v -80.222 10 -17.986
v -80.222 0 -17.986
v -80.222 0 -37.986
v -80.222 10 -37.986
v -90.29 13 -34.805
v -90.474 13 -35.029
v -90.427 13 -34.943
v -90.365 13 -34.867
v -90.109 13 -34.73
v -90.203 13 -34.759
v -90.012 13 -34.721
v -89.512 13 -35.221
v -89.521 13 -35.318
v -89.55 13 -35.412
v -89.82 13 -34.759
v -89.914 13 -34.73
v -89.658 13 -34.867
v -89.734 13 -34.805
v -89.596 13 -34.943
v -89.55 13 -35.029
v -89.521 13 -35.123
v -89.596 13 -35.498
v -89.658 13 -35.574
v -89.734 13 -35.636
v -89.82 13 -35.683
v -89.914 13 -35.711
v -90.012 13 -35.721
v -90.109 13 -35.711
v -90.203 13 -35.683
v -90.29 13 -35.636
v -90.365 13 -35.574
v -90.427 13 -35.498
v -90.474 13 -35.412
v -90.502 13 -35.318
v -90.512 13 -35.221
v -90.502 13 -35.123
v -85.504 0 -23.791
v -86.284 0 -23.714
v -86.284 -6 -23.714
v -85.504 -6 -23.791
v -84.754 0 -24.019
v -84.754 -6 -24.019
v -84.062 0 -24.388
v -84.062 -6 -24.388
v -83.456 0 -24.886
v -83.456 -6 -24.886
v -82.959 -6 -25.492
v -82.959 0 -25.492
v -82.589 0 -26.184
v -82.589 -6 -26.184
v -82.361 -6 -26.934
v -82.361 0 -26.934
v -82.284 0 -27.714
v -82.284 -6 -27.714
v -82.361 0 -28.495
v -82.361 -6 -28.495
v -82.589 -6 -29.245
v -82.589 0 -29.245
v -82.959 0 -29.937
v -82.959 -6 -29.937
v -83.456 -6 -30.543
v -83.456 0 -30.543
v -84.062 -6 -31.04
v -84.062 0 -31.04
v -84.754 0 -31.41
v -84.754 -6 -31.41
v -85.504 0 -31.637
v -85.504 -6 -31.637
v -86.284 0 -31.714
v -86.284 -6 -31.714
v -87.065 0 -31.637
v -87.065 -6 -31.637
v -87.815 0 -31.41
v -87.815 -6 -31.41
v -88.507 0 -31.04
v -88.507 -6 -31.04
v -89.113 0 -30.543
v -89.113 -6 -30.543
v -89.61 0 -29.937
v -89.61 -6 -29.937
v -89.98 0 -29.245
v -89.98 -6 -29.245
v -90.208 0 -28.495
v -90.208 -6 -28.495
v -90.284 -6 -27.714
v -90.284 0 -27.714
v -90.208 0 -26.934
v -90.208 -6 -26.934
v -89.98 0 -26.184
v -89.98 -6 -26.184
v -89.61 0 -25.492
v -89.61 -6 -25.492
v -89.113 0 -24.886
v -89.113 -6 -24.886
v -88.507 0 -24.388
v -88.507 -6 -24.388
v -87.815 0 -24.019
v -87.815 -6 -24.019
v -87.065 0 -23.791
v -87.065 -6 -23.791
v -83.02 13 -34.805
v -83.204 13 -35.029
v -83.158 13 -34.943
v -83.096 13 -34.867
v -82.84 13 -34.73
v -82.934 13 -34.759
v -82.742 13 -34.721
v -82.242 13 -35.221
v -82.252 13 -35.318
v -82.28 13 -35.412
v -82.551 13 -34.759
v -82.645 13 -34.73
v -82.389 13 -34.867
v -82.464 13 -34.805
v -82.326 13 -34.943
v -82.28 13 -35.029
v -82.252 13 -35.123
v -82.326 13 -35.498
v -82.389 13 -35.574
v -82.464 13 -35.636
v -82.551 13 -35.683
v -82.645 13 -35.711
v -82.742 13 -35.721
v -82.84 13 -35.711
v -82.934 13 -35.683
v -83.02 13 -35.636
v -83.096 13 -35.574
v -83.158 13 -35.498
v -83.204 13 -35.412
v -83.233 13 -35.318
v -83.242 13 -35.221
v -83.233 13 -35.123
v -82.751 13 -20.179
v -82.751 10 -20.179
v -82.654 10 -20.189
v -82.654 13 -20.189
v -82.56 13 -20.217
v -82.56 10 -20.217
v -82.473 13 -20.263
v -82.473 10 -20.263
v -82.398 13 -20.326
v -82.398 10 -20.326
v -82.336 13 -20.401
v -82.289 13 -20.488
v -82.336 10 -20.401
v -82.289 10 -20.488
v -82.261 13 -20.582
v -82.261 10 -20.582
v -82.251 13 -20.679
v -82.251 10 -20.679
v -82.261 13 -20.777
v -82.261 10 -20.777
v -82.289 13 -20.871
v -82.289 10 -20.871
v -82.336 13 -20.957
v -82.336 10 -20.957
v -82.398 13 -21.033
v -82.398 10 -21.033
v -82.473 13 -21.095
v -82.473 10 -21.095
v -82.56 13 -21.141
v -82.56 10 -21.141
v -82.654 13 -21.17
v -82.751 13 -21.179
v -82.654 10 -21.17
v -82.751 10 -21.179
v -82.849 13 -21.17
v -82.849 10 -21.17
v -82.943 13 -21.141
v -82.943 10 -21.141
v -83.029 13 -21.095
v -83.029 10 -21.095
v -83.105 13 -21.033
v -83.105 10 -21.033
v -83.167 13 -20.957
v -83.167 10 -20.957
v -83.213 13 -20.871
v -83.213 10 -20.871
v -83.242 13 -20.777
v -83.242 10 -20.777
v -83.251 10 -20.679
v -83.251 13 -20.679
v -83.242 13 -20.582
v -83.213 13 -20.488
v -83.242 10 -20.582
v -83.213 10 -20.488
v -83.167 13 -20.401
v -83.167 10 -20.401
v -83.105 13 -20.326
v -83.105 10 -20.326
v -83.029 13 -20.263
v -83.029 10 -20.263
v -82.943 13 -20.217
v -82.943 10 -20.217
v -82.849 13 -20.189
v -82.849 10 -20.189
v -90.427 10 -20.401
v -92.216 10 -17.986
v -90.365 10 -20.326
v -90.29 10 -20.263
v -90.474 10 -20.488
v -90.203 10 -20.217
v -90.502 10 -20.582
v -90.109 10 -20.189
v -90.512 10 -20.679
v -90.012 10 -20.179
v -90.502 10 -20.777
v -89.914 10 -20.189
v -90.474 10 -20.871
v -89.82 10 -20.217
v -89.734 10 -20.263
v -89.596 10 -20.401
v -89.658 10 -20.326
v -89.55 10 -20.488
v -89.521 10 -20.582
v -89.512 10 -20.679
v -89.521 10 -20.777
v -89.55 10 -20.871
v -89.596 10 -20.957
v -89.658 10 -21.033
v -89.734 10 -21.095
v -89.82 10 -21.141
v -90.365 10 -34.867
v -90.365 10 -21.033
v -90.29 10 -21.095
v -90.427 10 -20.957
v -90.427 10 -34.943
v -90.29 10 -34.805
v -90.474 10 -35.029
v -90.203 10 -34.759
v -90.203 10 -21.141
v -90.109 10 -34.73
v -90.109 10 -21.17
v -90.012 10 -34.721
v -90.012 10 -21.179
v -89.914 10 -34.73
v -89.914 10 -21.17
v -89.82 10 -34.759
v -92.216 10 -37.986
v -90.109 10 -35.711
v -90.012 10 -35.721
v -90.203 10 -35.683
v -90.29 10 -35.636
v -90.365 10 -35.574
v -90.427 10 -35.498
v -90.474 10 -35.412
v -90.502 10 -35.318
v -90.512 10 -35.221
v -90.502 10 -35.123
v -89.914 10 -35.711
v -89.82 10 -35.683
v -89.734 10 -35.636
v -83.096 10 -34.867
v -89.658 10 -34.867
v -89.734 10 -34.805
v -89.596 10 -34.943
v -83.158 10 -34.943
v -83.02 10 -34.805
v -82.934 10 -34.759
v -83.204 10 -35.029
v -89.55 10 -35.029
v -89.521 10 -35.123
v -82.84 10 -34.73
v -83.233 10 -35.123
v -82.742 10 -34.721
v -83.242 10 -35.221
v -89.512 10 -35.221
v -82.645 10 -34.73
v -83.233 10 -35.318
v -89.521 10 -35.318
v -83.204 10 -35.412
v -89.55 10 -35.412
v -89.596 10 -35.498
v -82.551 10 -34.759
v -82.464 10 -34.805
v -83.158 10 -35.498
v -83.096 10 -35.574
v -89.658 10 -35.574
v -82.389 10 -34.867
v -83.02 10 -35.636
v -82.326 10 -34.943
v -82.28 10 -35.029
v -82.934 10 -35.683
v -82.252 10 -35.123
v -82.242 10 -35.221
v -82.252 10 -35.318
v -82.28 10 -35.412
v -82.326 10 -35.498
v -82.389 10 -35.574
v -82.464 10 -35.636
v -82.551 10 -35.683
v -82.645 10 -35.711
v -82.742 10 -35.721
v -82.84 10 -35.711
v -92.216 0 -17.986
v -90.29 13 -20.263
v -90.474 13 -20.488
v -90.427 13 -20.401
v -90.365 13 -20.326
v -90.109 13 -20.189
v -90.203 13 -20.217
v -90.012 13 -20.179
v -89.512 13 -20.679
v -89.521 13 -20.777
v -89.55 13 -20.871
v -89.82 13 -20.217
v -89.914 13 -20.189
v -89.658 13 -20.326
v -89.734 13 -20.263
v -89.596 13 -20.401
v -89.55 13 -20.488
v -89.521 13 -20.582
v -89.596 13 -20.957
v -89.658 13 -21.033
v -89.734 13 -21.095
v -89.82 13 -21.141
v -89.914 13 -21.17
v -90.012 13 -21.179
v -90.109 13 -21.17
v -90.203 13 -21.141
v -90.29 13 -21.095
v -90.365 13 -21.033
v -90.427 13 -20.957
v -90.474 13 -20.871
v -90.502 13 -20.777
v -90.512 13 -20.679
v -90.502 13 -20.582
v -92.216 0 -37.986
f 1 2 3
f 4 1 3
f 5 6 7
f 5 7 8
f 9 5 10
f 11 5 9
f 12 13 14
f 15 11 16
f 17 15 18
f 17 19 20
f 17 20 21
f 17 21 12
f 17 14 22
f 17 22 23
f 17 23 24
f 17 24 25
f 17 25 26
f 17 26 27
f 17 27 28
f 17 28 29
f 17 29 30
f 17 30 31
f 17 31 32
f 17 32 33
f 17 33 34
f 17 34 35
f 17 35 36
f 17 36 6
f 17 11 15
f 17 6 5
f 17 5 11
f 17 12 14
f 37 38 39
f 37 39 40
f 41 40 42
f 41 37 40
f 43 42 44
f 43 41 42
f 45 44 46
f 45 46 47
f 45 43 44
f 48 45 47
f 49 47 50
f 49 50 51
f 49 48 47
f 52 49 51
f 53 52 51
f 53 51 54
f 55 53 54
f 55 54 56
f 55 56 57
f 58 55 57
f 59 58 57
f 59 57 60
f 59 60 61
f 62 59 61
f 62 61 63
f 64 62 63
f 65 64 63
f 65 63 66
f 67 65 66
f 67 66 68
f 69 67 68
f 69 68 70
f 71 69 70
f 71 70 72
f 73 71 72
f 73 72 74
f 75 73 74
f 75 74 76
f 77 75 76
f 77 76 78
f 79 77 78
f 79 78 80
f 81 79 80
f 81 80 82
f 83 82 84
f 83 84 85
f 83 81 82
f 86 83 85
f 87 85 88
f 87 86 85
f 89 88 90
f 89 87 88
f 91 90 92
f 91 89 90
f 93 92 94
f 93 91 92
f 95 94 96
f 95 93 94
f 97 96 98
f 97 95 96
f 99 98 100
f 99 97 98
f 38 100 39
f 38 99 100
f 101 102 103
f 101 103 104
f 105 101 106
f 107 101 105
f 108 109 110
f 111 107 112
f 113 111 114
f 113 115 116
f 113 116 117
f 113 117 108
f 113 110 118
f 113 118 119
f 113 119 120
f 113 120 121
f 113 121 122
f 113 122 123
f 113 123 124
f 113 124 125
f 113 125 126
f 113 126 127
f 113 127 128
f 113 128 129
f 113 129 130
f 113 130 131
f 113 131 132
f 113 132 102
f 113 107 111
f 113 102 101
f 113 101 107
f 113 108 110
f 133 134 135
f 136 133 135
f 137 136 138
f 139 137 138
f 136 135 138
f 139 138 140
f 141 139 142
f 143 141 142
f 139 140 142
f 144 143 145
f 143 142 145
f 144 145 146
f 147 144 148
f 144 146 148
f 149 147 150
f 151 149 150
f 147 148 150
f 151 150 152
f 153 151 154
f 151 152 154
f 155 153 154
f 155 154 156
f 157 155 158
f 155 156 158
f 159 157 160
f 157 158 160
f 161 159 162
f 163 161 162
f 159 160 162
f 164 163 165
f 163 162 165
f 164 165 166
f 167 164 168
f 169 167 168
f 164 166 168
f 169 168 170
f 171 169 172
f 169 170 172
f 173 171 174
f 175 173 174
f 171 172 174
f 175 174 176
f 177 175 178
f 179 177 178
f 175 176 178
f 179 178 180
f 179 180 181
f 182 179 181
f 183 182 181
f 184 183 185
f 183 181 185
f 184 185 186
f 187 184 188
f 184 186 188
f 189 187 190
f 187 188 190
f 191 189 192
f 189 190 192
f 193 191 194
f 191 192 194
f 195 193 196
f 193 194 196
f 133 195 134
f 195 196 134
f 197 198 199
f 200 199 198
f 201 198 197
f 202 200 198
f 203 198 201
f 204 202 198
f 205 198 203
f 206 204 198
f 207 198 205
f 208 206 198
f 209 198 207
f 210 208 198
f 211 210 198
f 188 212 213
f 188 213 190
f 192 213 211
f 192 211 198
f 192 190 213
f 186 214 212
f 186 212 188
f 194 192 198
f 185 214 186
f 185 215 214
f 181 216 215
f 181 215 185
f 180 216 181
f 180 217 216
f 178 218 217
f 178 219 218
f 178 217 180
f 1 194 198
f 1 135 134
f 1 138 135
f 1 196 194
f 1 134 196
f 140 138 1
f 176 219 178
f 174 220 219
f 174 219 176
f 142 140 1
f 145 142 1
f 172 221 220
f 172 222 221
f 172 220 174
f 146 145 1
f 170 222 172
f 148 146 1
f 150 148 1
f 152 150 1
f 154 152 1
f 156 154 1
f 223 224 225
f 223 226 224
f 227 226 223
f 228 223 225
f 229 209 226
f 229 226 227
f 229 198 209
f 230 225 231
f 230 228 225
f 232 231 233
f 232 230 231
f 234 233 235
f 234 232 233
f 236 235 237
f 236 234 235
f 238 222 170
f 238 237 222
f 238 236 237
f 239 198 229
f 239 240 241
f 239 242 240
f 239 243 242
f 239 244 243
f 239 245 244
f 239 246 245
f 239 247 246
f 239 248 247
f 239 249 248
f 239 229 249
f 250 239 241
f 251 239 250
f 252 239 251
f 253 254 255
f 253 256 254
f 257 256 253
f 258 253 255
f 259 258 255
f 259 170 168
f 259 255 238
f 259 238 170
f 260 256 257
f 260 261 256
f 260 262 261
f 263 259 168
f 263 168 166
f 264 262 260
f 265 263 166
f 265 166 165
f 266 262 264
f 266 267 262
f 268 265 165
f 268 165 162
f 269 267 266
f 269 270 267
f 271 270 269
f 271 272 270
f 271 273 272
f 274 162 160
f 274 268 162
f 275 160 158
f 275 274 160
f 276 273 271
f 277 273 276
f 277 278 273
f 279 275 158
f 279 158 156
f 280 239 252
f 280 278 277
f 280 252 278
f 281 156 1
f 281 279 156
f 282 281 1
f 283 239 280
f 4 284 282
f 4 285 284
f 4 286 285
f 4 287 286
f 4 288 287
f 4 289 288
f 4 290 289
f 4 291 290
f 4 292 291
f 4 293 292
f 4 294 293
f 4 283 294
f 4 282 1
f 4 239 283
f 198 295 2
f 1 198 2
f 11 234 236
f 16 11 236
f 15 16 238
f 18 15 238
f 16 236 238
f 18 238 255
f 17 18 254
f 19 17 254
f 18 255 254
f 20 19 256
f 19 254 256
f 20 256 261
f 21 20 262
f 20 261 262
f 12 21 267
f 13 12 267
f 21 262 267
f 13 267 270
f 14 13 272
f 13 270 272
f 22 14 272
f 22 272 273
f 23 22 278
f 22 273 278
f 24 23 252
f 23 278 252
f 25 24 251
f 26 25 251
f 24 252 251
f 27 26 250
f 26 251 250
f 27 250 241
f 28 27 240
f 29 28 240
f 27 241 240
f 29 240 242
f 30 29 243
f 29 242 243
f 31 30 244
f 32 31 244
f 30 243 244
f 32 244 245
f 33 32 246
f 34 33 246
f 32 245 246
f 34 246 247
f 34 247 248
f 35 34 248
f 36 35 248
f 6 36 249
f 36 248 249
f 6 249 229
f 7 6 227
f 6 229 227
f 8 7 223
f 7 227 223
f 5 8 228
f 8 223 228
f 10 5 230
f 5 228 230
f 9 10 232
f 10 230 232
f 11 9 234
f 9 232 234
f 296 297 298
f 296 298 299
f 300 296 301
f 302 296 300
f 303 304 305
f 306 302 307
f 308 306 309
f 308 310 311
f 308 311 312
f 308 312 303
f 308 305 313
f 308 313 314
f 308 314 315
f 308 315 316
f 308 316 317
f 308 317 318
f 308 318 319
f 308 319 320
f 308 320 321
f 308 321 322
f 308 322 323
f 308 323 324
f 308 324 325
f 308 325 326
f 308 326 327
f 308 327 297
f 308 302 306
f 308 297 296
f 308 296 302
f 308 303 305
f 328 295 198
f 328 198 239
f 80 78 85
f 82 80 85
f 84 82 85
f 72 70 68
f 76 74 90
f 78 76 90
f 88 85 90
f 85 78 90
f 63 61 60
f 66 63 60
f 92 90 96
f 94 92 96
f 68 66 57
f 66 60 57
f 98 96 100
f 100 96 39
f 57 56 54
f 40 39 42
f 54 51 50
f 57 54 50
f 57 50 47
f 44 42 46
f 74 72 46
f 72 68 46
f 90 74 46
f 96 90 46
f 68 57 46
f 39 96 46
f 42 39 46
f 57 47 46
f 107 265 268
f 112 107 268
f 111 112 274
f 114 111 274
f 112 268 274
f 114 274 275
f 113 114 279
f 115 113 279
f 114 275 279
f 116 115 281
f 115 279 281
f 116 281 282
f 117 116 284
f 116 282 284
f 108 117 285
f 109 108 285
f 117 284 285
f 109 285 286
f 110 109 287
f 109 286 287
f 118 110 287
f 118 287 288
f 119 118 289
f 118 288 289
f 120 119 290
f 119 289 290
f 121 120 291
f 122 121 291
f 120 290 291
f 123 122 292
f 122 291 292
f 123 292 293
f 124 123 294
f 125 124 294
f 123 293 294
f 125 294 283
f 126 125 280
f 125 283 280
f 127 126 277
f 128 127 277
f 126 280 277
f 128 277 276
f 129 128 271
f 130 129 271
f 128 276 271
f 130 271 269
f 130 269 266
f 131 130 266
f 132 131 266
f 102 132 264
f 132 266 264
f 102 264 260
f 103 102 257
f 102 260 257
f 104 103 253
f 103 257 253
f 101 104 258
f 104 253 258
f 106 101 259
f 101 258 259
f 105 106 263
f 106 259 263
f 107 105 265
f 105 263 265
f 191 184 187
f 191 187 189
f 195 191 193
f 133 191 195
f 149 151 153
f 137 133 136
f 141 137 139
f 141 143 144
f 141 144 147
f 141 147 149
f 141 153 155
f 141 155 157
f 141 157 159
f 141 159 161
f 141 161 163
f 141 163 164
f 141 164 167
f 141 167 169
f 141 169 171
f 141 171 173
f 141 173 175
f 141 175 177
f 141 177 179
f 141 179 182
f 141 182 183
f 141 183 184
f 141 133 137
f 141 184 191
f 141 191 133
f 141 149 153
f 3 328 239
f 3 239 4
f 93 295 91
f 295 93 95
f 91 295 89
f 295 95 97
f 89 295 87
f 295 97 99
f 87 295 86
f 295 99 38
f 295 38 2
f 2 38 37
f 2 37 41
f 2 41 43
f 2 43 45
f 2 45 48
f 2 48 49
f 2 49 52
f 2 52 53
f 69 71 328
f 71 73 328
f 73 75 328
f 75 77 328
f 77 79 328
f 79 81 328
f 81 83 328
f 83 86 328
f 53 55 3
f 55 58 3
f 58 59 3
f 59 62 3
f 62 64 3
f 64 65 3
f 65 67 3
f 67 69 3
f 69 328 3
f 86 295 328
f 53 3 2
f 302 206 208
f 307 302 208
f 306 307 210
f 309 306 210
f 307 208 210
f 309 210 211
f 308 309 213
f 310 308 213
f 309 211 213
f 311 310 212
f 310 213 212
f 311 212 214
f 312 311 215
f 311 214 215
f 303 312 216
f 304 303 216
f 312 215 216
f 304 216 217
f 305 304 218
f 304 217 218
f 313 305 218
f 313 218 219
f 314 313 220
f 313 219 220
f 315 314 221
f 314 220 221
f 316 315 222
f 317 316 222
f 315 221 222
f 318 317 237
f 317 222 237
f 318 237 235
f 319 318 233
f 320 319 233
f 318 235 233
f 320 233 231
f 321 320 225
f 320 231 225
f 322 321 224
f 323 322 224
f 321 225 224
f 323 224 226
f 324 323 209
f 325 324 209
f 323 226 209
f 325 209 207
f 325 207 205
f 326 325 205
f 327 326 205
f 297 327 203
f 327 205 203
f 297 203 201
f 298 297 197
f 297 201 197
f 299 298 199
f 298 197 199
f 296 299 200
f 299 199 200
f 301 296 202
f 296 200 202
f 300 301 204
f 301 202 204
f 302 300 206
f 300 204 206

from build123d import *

# Parameters (mm, degrees)
BOSS_EXTRUDE1_DEPTH      = 10
BOSS_EXTRUDE1_DEPTH_BACK = 0.0001
SKETCH2_W                = 11.99345044
SKETCH2_H                = 20
SKETCH3_R                = 4
BOSS_EXTRUDE3_DEPTH      = 6
SKETCH4_R                = 0.5
BOSS_EXTRUDE4_DEPTH      = 3


with BuildPart() as part:
    # Sketch2 → Boss-Extrude1 (new, two sides: drawn at the far end of the back side and taken through both)
    with BuildSketch(Plane(origin=(0, 0, -0.145481973), x_dir=(1, 0, 0), z_dir=(0, 1, 0)).offset(-BOSS_EXTRUDE1_DEPTH_BACK)):
        with Locations((-86.219016819, 27.840556499)):
            Rectangle(SKETCH2_W, SKETCH2_H)
    extrude(amount=BOSS_EXTRUDE1_DEPTH + BOSS_EXTRUDE1_DEPTH_BACK)

    # Sketch3 → Boss-Extrude3 (add)
    with BuildSketch(Plane(origin=(-2.285199676, 0, 0), x_dir=(1, 0, 0), z_dir=(0, 1, 0))):
        with Locations(Location((-83.999243897, 27.714265915, 0), (0, 0, 270))):
            Circle(SKETCH3_R)
    extrude(amount=-BOSS_EXTRUDE3_DEPTH)

    # Sketch4 → Boss-Extrude4 (add)
    with BuildSketch(Plane(origin=(-0.419617144, 10, -0.145481973), x_dir=(1, 0, 0), z_dir=(0, 1, 0))):
        with Locations(Location((-89.592112579, 35.075202762, 0), (0, 0, 270))):
            Circle(SKETCH4_R)
        with Locations(Location((-82.322613513, 35.075202762, 0), (0, 0, 270))):
            Circle(SKETCH4_R)
        with Locations(Location((-82.331654895, 20.533744188, 0), (0, 0, 270))):
            Circle(SKETCH4_R)
        with Locations(Location((-89.592112579, 20.533744188, 0), (0, 0, 270))):
            Circle(SKETCH4_R)
    extrude(amount=BOSS_EXTRUDE4_DEPTH)


solid = part.part
